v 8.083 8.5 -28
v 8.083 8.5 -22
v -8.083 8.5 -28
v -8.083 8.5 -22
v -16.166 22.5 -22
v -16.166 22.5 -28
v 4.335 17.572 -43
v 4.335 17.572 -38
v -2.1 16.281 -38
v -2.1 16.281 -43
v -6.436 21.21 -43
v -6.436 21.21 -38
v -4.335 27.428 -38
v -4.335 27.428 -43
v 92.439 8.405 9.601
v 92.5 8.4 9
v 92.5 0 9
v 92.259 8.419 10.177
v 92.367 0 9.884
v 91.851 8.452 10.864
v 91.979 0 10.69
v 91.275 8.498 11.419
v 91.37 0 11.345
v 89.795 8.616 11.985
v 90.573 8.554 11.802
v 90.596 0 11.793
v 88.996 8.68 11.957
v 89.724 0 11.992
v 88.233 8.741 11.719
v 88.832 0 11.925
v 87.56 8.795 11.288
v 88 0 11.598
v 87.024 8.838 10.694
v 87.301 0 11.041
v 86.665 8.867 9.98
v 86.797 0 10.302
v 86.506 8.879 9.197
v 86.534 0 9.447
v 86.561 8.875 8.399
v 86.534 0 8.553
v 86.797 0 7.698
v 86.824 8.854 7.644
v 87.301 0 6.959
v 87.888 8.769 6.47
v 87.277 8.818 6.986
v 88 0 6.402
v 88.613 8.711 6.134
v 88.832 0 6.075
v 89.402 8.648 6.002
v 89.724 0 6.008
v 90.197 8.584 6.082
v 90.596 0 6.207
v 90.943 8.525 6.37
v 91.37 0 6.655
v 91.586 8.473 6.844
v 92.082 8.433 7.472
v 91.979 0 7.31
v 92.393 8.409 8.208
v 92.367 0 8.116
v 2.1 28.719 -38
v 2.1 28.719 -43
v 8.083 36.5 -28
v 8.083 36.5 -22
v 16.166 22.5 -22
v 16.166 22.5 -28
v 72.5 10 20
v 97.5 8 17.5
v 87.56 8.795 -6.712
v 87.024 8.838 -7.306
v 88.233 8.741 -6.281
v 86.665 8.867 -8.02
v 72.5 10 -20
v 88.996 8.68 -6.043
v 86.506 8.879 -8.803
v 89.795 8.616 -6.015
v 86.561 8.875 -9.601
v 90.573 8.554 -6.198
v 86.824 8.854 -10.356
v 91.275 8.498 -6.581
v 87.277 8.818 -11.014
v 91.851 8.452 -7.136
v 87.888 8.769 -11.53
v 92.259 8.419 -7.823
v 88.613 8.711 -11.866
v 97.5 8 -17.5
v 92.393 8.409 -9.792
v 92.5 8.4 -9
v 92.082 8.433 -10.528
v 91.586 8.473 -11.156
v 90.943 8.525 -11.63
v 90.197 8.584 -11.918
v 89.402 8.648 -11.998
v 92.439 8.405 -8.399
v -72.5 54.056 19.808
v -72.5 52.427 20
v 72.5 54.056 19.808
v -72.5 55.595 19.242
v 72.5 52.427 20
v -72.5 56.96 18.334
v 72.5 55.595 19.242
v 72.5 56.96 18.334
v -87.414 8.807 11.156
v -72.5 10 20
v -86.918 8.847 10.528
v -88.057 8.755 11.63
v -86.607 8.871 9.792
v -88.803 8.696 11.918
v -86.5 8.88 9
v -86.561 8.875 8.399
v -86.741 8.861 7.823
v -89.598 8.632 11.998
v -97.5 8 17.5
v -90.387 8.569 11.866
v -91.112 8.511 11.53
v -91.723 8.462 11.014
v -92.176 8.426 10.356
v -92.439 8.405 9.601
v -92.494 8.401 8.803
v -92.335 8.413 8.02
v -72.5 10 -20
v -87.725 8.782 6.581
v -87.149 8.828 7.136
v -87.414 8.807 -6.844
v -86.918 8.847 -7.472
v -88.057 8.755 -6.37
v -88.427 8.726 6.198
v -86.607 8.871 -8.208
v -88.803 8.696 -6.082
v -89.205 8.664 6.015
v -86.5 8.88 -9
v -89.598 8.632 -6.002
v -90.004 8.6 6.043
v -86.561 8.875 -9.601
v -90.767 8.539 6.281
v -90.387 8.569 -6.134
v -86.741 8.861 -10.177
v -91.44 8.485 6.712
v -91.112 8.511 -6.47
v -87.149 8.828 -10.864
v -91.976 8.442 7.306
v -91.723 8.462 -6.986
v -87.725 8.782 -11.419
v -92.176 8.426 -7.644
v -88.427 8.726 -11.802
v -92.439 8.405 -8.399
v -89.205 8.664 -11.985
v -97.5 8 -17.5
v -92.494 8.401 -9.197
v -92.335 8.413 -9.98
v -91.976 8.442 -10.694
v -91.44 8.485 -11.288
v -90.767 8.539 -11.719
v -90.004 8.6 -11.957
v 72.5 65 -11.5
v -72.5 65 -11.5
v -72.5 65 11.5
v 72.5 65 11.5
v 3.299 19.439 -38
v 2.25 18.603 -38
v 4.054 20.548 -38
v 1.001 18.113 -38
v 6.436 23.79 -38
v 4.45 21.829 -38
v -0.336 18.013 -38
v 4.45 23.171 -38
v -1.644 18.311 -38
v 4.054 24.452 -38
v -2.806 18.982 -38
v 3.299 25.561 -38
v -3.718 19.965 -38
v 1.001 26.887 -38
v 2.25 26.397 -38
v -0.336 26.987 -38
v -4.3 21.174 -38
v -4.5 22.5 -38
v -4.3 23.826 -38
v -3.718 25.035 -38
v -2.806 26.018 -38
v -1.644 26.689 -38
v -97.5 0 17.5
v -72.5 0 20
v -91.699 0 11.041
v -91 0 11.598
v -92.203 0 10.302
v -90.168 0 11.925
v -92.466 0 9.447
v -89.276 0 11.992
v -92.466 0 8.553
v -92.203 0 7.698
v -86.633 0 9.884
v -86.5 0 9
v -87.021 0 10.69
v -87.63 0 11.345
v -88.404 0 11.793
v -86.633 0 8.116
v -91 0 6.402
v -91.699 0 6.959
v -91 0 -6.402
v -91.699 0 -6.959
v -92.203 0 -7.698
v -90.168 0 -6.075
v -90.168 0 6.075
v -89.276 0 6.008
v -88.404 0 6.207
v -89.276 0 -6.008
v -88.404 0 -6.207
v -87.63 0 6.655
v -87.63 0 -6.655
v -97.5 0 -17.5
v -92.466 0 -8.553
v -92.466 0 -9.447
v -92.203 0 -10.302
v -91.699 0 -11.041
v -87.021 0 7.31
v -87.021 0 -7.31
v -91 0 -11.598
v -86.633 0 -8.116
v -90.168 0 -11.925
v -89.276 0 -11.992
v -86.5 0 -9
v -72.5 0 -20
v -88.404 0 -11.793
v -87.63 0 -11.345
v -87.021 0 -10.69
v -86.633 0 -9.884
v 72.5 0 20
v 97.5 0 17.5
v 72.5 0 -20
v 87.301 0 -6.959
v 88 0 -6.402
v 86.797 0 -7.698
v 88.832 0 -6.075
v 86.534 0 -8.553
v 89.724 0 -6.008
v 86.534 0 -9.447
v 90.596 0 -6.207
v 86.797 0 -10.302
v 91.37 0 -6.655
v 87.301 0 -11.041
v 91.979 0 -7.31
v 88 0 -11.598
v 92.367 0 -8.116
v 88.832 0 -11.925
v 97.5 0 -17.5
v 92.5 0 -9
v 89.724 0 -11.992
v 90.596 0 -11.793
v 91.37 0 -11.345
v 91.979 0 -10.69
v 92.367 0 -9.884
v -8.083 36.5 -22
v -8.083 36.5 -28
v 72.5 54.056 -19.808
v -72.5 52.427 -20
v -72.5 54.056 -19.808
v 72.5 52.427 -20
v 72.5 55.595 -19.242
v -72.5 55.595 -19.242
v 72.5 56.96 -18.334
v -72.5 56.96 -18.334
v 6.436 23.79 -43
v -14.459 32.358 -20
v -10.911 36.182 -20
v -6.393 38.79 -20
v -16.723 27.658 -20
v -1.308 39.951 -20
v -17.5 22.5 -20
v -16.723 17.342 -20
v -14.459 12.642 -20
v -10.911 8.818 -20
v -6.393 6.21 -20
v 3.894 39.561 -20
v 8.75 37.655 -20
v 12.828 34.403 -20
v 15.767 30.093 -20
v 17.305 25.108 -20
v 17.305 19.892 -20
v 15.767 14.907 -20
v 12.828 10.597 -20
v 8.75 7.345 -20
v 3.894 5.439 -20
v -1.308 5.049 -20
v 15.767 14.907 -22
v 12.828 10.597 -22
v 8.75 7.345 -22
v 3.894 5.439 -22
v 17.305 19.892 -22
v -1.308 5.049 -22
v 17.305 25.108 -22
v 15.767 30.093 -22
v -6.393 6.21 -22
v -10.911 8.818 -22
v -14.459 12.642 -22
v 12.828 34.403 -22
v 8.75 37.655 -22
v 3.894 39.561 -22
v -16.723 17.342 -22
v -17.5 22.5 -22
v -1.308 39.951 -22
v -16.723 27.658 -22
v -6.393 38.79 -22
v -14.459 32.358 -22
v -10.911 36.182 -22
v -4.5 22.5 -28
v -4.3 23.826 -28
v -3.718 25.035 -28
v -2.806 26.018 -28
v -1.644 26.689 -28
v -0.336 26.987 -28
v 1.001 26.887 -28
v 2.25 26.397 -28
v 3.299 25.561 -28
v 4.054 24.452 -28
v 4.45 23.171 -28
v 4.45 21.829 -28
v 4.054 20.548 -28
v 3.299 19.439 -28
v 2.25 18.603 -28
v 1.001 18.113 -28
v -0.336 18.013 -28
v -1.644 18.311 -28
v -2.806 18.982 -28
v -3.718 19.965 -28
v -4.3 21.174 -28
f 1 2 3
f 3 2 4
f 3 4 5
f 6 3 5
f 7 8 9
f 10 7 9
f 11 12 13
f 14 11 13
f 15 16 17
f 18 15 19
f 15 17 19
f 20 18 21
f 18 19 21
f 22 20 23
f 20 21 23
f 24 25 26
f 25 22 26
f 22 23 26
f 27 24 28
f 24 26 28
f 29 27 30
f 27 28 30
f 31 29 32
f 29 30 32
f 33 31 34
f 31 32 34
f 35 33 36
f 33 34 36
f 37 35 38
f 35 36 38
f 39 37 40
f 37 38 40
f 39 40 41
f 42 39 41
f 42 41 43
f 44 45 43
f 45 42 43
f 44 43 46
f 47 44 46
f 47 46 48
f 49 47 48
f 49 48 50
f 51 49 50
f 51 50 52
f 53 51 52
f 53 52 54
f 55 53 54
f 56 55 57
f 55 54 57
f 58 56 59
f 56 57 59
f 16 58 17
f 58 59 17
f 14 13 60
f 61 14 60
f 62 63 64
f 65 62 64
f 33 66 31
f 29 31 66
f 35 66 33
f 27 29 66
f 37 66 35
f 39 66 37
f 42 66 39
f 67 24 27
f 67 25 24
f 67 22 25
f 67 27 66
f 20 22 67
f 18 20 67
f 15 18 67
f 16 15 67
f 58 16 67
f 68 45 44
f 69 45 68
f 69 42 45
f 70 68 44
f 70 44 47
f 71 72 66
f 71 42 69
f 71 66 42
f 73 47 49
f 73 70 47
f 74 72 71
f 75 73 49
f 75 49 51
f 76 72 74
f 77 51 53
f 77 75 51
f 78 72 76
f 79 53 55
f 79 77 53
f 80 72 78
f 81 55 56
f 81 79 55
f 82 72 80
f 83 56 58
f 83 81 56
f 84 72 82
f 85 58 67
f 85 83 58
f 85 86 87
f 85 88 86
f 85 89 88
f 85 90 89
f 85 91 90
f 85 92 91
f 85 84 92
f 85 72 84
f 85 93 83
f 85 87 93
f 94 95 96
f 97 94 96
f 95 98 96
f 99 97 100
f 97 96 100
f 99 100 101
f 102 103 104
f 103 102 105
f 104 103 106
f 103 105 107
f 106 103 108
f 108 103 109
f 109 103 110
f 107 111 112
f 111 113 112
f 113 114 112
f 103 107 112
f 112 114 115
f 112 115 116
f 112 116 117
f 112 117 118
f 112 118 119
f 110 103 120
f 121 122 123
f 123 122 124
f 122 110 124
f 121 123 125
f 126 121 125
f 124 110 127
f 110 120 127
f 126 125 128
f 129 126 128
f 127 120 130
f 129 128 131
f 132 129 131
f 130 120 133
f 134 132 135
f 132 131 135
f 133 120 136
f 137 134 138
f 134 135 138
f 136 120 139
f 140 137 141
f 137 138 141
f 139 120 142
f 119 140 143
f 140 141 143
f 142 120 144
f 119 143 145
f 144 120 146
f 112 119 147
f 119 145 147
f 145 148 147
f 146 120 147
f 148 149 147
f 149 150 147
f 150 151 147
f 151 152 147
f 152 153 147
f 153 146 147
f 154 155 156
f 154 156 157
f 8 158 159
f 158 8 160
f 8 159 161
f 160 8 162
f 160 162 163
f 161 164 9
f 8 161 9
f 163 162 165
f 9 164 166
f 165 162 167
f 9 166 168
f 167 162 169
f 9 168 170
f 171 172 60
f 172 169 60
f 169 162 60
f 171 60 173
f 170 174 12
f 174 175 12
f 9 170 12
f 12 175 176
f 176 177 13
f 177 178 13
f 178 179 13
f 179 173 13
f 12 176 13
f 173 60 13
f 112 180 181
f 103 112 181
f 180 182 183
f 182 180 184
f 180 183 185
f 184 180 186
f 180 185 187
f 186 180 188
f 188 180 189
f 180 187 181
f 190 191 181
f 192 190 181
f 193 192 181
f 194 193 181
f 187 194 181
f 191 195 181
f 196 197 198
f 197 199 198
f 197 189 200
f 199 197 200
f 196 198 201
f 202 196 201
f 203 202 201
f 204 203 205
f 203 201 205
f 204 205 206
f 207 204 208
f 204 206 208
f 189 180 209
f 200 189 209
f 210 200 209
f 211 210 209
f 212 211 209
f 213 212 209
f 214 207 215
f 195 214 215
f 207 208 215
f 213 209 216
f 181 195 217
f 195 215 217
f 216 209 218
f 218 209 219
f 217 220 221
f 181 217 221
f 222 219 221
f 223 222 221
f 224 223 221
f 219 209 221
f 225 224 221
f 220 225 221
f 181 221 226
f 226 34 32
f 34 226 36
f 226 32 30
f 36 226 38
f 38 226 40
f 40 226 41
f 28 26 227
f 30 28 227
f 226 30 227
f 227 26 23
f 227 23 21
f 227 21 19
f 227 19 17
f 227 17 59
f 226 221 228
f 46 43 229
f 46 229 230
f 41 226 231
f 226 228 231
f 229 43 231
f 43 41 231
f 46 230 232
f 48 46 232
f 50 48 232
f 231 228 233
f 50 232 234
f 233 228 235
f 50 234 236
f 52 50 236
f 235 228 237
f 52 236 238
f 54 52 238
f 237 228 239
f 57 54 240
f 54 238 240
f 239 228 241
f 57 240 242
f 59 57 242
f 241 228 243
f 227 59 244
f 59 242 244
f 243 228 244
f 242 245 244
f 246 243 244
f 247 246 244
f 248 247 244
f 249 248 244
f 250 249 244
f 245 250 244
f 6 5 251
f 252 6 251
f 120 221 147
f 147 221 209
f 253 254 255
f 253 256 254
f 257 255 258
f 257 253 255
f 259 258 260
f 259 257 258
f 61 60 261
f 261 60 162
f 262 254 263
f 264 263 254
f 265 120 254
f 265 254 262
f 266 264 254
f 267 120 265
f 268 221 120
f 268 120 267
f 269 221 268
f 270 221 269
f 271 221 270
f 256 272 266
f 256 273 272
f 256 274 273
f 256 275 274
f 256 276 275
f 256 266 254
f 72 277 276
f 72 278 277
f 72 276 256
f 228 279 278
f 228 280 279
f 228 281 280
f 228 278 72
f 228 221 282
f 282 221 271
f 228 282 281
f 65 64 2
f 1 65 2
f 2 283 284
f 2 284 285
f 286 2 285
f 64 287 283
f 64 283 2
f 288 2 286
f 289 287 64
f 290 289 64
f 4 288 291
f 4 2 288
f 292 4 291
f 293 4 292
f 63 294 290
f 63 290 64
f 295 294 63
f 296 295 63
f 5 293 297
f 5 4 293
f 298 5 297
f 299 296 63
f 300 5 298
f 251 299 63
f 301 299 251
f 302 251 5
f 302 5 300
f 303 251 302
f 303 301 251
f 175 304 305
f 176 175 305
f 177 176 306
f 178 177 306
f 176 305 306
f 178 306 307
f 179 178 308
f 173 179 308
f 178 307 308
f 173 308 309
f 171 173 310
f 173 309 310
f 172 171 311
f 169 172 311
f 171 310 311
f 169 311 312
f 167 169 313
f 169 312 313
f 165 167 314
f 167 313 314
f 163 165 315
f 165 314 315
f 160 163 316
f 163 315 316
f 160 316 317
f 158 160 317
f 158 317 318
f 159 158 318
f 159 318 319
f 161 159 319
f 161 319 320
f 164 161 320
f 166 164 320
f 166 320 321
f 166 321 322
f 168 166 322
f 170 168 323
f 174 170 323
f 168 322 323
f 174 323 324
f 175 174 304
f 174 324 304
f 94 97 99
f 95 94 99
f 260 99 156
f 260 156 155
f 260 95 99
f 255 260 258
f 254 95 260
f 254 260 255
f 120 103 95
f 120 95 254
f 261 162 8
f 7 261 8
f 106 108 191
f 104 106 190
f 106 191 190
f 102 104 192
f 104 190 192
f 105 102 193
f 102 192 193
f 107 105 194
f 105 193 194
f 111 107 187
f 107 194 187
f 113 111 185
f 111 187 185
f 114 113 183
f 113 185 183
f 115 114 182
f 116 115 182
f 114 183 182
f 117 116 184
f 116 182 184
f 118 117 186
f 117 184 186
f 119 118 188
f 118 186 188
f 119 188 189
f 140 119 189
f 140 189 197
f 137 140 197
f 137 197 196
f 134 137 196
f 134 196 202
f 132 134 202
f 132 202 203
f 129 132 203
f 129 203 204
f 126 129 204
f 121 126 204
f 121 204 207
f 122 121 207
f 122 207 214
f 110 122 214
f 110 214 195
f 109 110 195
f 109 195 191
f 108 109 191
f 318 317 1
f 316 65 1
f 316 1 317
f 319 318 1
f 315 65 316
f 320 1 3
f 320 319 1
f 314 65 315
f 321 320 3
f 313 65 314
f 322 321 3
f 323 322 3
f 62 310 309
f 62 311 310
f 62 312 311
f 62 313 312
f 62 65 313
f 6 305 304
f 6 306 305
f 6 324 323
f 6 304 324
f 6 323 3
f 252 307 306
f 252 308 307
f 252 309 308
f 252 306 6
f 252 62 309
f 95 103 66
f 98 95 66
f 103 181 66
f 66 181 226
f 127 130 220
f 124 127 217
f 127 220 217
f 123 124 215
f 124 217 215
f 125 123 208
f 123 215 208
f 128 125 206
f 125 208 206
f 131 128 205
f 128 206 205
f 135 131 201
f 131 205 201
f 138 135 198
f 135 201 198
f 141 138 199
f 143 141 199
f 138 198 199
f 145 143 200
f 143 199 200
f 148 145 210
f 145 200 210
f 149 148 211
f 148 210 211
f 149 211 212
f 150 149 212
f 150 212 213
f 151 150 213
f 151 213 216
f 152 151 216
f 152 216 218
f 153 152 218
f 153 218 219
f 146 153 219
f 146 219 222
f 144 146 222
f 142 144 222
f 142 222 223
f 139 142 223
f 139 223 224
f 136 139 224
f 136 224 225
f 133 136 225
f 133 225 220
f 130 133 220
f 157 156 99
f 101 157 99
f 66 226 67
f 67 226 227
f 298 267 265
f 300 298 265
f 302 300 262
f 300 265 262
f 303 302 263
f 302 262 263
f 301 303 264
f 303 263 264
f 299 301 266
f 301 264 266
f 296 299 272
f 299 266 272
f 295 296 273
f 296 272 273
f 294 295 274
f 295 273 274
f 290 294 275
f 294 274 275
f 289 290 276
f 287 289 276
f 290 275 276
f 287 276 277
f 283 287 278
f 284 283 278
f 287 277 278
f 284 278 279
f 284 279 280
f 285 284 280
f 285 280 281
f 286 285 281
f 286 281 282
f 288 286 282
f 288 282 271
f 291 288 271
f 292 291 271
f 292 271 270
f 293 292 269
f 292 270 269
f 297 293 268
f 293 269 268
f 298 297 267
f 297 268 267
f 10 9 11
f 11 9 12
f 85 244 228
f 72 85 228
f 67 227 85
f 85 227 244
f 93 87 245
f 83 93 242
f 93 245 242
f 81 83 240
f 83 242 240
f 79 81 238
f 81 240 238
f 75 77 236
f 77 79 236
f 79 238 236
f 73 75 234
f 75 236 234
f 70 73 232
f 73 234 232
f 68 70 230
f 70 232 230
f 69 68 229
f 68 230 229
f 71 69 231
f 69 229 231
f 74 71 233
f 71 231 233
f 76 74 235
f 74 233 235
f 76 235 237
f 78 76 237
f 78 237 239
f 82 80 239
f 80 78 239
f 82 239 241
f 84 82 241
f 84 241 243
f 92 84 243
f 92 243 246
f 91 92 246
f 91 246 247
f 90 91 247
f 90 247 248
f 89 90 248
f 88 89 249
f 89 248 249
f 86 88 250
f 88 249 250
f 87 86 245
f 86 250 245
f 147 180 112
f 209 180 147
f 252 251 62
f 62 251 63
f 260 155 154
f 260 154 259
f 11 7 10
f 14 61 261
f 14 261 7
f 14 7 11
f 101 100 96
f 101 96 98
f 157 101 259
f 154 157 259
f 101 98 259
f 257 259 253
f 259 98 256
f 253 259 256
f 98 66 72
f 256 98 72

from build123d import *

# Parameters (mm, degrees)
SKETCH1_W           = 195
SKETCH1_H           = 40
BOSS_EXTRUDE1_DEPTH = 10
SKETCH2_W           = 145
SKETCH2_H           = 40
BOSS_EXTRUDE2_DEPTH = 55
CUT_EXTRUDE1_DEPTH  = 237
FILLET1_R           = 7
CUT_EXTRUDE2_DEPTH  = 237
CUT_EXTRUDE3_DEPTH  = 237
SKETCH6_R           = 3
CUT_EXTRUDE4_DEPTH  = 237
SKETCH7_R           = 17.5
BOSS_EXTRUDE3_DEPTH = 2
BOSS_EXTRUDE4_DEPTH = 6
SKETCH9_R           = 4.5
BOSS_EXTRUDE5_DEPTH = 10
BOSS_EXTRUDE7_DEPTH = 5


with BuildPart() as part:
    # Sketch1 → Boss-Extrude1 (new body)
    with BuildSketch(Plane(origin=(0, 0, 0), x_dir=(1, 0, 0), z_dir=(0, 1, 0))):
        Rectangle(SKETCH1_W, SKETCH1_H)
    extrude(amount=BOSS_EXTRUDE1_DEPTH)

    # Sketch2 → Boss-Extrude2 (add)
    with BuildSketch(Plane(origin=(0, 10, 0), x_dir=(1, 0, 0), z_dir=(0, 1, 0))):
        Rectangle(SKETCH2_W, SKETCH2_H)
    extrude(amount=BOSS_EXTRUDE2_DEPTH)

    # Sketch3 → Cut-Extrude1 (cut)
    with BuildSketch(Plane.ZY.offset(72.5)):
        Polygon((-11.5, 65), (-20, 55), (-20, 68.642587118), align=None)
        Polygon((11.5, 65), (20, 55), (20, 68.642587118), align=None)
    extrude(amount=-CUT_EXTRUDE1_DEPTH, mode=Mode.SUBTRACT)

    # Fillet1
    fillet1_edges = [part.edges().sort_by_distance(p)[0] for p in [
        (0, 55, -20),
        (0, 55, 20),
    ]]
    fillet(fillet1_edges, radius=FILLET1_R)

    # Sketch4 → Cut-Extrude2 (cut)
    with BuildSketch(Plane(origin=(0, 0, -20), x_dir=(-1, 0, 0), z_dir=(0, 0, -1))):
        Polygon((72.5, 10), (97.5, 8), (97.5, 10), align=None)
        Polygon((-97.5, 10), (-72.5, 10), (-97.5, 8), align=None)
    extrude(amount=-CUT_EXTRUDE2_DEPTH, mode=Mode.SUBTRACT)

    # Sketch5 → Cut-Extrude3 (cut)
    with BuildSketch(Plane.XZ):
        Polygon((97.5, -20), (97.5, -17.5), (72.5, -20), align=None)
        Polygon((97.5, 20), (72.5, 20), (97.5, 17.5), align=None)
        Polygon((-97.5, 17.5), (-72.5, 20), (-97.5, 20), align=None)
        Polygon((-72.5, -20), (-97.5, -17.5), (-97.5, -20), align=None)
    extrude(amount=-CUT_EXTRUDE3_DEPTH, mode=Mode.SUBTRACT)

    # Sketch6 → Cut-Extrude4 (cut)
    with BuildSketch(Plane.XZ):
        with Locations((89.5, 9)):
            Circle(SKETCH6_R)
        with Locations((89.5, -9)):
            Circle(SKETCH6_R)
        with Locations((-89.5, 9)):
            Circle(SKETCH6_R)
        with Locations((-89.5, -9)):
            Circle(SKETCH6_R)
    extrude(amount=-CUT_EXTRUDE4_DEPTH, mode=Mode.SUBTRACT)

    # Sketch7 → Boss-Extrude3 (add)
    with BuildSketch(Plane(origin=(0, 0, -20), x_dir=(-1, 0, 0), z_dir=(0, 0, -1))):
        with Locations((0, 22.5)):
            Circle(SKETCH7_R)
    extrude(amount=BOSS_EXTRUDE3_DEPTH)

    # Sketch8 → Boss-Extrude4 (add)
    with BuildSketch(Plane(origin=(0, 0, -22), x_dir=(-1, 0, 0), z_dir=(0, 0, -1))):
        Polygon((8.082903769, 8.5), (16.165807537, 22.5), (8.082903769, 36.5), (-8.082903769, 36.5), (-16.165807537, 22.5), (-8.082903769, 8.5), align=None)
    extrude(amount=BOSS_EXTRUDE4_DEPTH)

    # Sketch9 → Boss-Extrude5 (add)
    with BuildSketch(Plane(origin=(0, 0, -28), x_dir=(-1, 0, 0), z_dir=(0, 0, -1))):
        with Locations((0, 22.5)):
            Circle(SKETCH9_R)
    extrude(amount=BOSS_EXTRUDE5_DEPTH)

    # Sketch12 → Boss-Extrude7 (add)
    with BuildSketch(Plane(origin=(0, 0, -38), x_dir=(-1, 0, 0), z_dir=(0, 0, -1))):
        Polygon((2.100473826, 16.281199441), (6.435876178, 21.209663414), (4.335402352, 27.428463972), (-2.100473826, 28.718800559), (-6.435876178, 23.790336586), (-4.335402352, 17.571536028), align=None)
    extrude(amount=BOSS_EXTRUDE7_DEPTH)


solid = part.part
